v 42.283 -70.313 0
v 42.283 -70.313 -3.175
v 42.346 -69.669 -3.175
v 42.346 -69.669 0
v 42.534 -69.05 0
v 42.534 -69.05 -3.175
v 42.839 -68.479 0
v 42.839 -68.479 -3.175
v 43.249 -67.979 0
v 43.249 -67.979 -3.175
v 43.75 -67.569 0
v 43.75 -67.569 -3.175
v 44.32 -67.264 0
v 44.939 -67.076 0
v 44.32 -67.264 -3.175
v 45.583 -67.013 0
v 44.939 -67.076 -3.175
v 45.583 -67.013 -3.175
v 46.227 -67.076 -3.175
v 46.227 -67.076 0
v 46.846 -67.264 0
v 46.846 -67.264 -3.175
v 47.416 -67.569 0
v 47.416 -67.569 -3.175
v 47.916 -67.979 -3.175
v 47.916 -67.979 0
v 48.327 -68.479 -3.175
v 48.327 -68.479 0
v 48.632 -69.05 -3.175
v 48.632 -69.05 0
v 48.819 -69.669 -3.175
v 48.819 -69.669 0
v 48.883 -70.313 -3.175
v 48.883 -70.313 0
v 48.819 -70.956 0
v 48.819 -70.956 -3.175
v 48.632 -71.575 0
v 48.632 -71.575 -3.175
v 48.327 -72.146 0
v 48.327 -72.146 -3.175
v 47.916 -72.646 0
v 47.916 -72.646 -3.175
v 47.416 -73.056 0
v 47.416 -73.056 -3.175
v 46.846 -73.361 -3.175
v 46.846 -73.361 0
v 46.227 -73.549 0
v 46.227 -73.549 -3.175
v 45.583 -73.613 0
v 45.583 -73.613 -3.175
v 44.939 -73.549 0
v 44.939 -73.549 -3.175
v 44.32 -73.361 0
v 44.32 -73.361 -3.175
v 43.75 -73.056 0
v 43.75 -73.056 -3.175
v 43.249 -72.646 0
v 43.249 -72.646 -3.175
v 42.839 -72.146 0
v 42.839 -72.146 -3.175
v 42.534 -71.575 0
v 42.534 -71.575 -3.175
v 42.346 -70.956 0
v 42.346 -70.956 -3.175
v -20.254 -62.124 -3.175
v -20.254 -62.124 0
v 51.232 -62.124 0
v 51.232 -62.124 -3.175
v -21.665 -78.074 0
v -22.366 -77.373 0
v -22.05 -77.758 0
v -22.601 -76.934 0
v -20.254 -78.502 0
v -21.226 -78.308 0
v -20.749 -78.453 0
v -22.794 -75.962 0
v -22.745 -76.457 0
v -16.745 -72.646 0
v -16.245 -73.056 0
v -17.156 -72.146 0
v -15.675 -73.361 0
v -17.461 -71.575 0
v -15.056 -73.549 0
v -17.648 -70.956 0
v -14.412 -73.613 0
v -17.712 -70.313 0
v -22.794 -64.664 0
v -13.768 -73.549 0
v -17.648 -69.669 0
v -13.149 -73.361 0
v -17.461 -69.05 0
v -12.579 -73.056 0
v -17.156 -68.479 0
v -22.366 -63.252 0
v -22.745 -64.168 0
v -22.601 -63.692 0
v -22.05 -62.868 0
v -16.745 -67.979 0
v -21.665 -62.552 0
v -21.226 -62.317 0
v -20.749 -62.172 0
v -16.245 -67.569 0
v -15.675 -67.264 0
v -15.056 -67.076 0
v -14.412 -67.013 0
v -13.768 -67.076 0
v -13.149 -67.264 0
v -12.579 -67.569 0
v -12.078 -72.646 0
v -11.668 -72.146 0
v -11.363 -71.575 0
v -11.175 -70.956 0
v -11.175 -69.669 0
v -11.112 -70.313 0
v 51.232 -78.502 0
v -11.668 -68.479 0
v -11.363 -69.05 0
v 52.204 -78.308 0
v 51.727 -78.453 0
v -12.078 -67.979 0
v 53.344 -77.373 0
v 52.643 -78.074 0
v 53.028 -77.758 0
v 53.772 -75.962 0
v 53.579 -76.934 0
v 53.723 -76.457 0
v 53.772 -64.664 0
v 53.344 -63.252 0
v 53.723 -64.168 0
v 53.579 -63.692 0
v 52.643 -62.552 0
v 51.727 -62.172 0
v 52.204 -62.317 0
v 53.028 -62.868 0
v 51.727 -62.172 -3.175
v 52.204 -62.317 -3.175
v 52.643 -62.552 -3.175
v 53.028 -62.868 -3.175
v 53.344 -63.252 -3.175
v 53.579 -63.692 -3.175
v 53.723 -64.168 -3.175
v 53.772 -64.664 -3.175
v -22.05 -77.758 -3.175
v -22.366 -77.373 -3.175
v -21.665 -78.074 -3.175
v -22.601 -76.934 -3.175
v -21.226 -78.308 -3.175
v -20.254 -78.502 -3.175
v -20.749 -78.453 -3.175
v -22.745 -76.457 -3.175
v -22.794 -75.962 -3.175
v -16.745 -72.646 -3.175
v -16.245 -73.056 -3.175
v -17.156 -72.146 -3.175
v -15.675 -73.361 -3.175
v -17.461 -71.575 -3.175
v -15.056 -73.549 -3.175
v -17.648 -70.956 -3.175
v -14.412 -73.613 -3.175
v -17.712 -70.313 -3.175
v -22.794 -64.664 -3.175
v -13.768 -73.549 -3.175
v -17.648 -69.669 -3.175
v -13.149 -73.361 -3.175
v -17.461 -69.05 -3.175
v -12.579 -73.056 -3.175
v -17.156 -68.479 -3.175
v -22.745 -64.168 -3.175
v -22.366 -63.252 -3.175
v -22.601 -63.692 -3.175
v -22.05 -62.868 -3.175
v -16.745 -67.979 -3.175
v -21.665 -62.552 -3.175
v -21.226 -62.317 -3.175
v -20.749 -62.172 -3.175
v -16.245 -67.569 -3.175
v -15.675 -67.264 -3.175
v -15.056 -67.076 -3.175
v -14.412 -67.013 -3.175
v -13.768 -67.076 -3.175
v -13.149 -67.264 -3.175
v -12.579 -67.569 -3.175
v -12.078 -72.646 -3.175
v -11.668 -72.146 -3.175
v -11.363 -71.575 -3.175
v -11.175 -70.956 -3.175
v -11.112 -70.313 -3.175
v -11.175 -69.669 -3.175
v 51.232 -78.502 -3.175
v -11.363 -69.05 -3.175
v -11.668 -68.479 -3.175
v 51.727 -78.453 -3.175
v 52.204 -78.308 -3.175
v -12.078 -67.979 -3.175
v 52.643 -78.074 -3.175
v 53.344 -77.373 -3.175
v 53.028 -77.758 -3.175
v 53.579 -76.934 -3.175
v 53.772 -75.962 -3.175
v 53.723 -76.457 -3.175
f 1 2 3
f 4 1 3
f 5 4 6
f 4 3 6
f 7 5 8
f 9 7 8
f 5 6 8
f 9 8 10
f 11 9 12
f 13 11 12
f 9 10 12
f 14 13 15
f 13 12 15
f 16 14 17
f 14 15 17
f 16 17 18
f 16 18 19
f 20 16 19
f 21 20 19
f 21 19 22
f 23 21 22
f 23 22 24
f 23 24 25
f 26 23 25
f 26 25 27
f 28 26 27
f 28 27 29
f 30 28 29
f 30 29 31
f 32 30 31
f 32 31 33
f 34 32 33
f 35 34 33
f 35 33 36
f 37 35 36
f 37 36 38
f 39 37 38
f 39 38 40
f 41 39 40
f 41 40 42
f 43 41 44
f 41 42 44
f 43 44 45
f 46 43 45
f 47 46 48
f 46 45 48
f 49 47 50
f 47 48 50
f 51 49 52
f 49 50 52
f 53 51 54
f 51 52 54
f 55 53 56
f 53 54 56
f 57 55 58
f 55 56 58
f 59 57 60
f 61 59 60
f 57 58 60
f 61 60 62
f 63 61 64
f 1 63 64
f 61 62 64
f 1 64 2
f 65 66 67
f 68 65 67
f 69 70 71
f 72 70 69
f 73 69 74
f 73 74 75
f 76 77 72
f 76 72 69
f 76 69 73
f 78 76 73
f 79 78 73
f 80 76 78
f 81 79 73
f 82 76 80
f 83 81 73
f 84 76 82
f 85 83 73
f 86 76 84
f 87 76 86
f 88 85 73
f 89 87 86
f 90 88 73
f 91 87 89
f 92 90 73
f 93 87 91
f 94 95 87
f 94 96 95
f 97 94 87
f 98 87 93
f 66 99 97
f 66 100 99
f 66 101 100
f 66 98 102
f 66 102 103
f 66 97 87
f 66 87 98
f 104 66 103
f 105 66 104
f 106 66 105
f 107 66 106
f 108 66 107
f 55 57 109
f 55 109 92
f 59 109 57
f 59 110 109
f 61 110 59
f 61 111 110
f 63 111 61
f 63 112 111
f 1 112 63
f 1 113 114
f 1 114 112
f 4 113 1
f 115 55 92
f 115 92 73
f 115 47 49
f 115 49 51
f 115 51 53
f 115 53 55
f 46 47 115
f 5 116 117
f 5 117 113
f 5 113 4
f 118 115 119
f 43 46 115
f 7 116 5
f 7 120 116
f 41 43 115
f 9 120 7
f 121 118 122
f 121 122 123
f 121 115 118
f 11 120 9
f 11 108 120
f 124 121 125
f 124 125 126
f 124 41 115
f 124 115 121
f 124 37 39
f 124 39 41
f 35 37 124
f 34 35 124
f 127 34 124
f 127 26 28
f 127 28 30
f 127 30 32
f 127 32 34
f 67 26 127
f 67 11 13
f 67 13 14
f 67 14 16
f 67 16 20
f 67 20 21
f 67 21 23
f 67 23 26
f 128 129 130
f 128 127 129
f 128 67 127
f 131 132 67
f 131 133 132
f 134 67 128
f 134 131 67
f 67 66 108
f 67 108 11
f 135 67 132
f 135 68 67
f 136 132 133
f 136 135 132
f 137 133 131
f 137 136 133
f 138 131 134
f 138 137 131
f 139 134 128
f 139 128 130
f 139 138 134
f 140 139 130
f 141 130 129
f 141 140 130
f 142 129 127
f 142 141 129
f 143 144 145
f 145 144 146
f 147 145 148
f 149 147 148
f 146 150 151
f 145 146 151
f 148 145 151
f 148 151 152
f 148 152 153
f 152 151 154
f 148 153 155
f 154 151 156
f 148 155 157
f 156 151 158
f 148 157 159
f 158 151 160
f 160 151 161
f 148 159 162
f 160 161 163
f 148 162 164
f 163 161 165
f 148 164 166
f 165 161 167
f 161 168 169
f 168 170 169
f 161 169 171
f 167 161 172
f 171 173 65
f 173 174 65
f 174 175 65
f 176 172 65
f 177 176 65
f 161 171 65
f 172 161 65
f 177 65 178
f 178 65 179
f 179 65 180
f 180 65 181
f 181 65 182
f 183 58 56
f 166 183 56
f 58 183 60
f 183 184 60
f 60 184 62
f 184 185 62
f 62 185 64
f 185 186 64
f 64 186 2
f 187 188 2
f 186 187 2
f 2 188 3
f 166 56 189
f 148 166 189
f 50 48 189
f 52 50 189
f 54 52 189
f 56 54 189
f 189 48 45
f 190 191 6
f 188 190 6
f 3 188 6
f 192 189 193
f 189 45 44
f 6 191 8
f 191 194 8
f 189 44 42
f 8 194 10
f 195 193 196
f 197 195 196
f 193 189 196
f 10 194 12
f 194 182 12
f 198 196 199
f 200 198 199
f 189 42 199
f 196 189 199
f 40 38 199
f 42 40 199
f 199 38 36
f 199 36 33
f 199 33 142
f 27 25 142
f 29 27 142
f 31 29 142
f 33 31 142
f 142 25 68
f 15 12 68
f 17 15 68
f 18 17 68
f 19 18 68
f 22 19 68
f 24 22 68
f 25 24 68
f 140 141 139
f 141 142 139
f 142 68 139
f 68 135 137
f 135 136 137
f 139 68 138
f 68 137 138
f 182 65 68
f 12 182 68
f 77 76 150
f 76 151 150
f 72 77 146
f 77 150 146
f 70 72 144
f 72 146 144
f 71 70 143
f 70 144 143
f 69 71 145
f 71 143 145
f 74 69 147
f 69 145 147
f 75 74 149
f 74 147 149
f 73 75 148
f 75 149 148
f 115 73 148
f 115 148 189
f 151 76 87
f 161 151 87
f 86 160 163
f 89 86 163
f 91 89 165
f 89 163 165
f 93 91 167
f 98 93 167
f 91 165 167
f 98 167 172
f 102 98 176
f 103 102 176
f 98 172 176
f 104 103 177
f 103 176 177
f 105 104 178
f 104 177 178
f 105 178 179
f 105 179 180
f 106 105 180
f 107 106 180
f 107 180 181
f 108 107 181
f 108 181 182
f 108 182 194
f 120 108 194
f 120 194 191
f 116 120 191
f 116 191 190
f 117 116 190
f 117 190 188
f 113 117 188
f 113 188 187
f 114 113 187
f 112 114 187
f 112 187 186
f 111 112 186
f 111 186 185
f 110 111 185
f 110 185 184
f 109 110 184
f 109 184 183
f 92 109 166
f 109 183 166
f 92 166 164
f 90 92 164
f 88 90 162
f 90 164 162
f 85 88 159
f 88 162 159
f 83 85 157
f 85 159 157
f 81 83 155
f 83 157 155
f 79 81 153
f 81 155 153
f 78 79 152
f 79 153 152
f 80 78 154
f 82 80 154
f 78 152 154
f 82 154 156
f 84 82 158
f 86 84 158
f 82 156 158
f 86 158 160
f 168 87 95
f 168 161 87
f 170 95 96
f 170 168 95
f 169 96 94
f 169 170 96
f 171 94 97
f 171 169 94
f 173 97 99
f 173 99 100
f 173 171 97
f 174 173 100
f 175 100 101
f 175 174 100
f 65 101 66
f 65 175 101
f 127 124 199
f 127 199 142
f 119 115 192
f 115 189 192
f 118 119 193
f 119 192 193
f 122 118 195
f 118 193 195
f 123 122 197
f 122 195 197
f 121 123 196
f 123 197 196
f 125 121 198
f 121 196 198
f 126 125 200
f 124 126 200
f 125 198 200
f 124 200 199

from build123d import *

# Parameters (mm, degrees)
SKETCH1_W            = 76.5658
SKETCH1_H            = 16.378
BASE_FLANGE1_DEPTH   = 3.175
M6_CLEARANCE_HOLE1_D = 6.6
FILLET1_R            = 2.54


# Sheet-metal steps are written as plain solids
with BuildPart() as part:
    # Sketch1 → Base-Flange1 (new body)
    with BuildSketch(Plane.XY):
        with Locations((15.489, -70.312600001)):
            Rectangle(SKETCH1_W, SKETCH1_H)
    extrude(amount=-BASE_FLANGE1_DEPTH)

    # M6 Clearance Hole1 (through all)
    with Locations(Plane.XY):
        with Locations((-14.4119, -70.312600001), (45.5829, -70.312600001)):
            Hole(M6_CLEARANCE_HOLE1_D / 2)

    # Fillet1
    fillet1_edges = [part.edges().sort_by_distance(p)[0] for p in [
        (-22.7939, -62.123600001, -1.5875),
        (53.7719, -62.123600001, -1.5875),
        (53.7719, -78.501600001, -1.5875),
        (-22.7939, -78.501600001, -1.5875),
    ]]
    fillet(fillet1_edges, radius=FILLET1_R)


solid = part.part
